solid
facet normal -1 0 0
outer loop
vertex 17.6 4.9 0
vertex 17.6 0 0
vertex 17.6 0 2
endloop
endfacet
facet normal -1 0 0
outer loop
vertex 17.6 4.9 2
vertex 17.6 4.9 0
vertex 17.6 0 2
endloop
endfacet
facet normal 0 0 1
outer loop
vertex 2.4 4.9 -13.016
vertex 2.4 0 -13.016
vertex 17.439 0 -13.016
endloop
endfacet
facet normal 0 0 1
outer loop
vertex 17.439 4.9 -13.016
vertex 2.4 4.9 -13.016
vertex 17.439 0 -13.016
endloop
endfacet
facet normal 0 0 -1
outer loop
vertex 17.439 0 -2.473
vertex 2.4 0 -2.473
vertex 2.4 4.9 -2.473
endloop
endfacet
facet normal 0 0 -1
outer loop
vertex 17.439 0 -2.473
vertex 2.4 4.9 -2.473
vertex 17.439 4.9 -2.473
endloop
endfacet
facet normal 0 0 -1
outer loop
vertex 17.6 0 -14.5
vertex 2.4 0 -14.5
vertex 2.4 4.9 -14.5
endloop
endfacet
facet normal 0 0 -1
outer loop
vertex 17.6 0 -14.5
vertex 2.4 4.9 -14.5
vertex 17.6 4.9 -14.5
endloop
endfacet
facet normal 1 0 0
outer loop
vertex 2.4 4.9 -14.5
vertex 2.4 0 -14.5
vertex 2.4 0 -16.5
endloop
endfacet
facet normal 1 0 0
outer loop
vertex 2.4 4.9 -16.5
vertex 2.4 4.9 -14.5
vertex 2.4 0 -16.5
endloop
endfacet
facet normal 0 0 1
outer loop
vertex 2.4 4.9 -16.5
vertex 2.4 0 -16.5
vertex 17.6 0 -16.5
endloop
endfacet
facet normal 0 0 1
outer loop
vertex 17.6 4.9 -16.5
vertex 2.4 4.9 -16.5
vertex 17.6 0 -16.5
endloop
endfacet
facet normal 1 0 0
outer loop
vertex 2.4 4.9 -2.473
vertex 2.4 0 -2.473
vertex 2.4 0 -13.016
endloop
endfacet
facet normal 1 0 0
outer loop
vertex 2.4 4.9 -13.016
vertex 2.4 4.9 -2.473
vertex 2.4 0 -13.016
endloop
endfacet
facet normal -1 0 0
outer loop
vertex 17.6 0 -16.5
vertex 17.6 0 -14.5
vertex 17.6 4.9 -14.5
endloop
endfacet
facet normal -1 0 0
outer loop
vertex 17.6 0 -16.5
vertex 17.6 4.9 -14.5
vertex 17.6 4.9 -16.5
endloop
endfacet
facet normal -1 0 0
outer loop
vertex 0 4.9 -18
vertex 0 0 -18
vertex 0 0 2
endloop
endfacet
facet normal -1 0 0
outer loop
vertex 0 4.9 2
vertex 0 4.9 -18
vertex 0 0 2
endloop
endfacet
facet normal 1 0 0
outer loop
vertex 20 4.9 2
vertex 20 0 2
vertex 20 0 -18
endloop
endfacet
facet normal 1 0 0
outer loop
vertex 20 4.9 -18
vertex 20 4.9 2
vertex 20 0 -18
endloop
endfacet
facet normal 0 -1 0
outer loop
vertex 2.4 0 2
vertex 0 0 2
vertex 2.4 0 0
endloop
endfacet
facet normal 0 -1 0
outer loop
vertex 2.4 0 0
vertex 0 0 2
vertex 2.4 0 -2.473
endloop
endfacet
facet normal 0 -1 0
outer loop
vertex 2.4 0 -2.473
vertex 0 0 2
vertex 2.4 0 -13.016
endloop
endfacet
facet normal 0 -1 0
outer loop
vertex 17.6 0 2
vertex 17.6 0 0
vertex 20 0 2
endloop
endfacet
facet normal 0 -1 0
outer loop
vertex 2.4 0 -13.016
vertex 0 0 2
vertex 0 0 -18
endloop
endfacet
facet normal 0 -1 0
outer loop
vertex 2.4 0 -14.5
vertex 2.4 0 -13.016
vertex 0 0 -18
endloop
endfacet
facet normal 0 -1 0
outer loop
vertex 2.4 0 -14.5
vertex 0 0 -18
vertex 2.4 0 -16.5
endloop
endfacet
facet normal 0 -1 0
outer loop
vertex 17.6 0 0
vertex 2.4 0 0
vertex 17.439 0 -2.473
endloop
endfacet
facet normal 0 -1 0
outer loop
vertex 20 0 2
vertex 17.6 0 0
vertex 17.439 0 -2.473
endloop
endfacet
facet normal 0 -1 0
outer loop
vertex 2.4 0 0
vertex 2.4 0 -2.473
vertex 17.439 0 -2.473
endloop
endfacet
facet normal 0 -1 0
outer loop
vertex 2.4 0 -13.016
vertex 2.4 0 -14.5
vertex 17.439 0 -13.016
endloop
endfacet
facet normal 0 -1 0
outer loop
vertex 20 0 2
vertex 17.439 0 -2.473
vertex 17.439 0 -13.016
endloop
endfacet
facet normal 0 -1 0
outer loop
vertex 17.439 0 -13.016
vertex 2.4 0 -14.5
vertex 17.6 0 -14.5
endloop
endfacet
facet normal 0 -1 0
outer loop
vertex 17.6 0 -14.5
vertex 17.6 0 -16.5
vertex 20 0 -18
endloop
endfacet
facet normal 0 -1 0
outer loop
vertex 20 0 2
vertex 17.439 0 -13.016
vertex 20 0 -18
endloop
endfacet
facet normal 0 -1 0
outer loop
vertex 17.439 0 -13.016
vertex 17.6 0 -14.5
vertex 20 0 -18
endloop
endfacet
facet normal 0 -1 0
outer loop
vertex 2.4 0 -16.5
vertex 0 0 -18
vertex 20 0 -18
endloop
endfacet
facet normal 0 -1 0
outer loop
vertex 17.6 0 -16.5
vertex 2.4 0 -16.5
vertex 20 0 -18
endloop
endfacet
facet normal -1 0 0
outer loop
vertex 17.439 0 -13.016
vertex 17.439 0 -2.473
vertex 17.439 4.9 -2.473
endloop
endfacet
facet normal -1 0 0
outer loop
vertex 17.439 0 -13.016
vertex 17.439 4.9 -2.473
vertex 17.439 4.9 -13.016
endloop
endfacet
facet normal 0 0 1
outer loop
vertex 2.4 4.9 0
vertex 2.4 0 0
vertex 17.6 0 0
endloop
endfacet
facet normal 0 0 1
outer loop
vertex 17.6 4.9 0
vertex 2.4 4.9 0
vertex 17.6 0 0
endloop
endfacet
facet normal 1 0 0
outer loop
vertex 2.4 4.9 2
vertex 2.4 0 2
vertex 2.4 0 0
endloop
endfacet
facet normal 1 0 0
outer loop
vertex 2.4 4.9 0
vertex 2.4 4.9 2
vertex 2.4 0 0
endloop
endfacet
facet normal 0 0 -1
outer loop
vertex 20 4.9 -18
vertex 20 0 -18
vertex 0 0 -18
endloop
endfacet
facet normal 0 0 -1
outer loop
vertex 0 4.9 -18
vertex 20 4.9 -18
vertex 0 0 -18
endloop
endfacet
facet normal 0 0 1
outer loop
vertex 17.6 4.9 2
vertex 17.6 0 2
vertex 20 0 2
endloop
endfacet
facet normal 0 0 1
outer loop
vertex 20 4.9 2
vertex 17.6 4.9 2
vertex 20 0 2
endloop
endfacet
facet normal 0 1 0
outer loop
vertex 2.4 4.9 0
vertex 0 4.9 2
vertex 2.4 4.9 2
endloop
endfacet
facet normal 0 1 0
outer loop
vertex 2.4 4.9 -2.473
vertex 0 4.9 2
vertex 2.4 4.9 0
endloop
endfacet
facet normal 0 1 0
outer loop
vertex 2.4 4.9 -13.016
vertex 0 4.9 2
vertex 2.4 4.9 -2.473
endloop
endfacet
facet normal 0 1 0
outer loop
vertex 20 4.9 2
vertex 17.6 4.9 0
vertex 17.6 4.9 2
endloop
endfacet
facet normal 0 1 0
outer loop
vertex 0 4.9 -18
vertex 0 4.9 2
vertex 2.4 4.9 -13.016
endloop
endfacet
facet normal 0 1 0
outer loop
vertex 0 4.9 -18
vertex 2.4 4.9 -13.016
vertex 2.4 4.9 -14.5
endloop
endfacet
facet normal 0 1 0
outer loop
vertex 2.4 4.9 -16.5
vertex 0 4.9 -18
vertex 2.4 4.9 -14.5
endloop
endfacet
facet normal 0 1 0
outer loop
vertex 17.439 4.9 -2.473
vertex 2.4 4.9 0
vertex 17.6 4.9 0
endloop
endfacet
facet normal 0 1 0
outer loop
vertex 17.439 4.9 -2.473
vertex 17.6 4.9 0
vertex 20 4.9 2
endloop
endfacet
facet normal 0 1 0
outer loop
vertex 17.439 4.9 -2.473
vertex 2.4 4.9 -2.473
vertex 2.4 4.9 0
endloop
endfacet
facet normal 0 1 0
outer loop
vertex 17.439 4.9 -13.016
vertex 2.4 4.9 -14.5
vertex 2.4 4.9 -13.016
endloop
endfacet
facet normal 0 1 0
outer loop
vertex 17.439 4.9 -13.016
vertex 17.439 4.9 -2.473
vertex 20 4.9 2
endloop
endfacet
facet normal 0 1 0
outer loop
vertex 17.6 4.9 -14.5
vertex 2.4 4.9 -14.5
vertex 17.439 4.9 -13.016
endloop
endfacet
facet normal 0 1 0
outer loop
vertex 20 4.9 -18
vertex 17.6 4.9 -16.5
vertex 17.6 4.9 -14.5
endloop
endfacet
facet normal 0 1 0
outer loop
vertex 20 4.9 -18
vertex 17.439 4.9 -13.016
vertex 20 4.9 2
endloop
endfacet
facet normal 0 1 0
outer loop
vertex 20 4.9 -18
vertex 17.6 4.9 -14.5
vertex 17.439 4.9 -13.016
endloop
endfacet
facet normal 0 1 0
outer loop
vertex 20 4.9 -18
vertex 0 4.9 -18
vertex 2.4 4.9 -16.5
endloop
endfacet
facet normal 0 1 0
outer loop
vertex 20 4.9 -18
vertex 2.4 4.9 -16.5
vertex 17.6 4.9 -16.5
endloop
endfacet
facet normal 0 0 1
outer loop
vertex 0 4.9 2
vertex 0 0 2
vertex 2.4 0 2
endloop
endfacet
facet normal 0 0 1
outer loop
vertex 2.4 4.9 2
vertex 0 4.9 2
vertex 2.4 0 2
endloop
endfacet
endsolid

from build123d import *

# Parameters (mm, degrees)
SKETCH1_W           = 15.039204539
SKETCH1_H           = 10.543027195
SKETCH1_W_2         = 15.2
SKETCH1_H_2         = 2
BOSS_EXTRUDE1_DEPTH = 4.9


with BuildPart() as part:
    # Sketch1 → Boss-Extrude1 (new body)
    with BuildSketch(Plane(origin=(0, 0, 0), x_dir=(1, 0, 0), z_dir=(0, 1, 0))):
        Polygon((2.4, 0), (17.6, 0), (17.6, -2), (20, -2), (20, 0), (20, 18), (0, 18), (0, 0), (0, -2), (2.4, -2), align=None)
        with Locations((9.91960227, 7.744546306)):
            Rectangle(SKETCH1_W, SKETCH1_H, mode=Mode.SUBTRACT)
        with Locations((10, 15.5)):
            Rectangle(SKETCH1_W_2, SKETCH1_H_2, mode=Mode.SUBTRACT)
    extrude(amount=BOSS_EXTRUDE1_DEPTH)


solid = part.part
